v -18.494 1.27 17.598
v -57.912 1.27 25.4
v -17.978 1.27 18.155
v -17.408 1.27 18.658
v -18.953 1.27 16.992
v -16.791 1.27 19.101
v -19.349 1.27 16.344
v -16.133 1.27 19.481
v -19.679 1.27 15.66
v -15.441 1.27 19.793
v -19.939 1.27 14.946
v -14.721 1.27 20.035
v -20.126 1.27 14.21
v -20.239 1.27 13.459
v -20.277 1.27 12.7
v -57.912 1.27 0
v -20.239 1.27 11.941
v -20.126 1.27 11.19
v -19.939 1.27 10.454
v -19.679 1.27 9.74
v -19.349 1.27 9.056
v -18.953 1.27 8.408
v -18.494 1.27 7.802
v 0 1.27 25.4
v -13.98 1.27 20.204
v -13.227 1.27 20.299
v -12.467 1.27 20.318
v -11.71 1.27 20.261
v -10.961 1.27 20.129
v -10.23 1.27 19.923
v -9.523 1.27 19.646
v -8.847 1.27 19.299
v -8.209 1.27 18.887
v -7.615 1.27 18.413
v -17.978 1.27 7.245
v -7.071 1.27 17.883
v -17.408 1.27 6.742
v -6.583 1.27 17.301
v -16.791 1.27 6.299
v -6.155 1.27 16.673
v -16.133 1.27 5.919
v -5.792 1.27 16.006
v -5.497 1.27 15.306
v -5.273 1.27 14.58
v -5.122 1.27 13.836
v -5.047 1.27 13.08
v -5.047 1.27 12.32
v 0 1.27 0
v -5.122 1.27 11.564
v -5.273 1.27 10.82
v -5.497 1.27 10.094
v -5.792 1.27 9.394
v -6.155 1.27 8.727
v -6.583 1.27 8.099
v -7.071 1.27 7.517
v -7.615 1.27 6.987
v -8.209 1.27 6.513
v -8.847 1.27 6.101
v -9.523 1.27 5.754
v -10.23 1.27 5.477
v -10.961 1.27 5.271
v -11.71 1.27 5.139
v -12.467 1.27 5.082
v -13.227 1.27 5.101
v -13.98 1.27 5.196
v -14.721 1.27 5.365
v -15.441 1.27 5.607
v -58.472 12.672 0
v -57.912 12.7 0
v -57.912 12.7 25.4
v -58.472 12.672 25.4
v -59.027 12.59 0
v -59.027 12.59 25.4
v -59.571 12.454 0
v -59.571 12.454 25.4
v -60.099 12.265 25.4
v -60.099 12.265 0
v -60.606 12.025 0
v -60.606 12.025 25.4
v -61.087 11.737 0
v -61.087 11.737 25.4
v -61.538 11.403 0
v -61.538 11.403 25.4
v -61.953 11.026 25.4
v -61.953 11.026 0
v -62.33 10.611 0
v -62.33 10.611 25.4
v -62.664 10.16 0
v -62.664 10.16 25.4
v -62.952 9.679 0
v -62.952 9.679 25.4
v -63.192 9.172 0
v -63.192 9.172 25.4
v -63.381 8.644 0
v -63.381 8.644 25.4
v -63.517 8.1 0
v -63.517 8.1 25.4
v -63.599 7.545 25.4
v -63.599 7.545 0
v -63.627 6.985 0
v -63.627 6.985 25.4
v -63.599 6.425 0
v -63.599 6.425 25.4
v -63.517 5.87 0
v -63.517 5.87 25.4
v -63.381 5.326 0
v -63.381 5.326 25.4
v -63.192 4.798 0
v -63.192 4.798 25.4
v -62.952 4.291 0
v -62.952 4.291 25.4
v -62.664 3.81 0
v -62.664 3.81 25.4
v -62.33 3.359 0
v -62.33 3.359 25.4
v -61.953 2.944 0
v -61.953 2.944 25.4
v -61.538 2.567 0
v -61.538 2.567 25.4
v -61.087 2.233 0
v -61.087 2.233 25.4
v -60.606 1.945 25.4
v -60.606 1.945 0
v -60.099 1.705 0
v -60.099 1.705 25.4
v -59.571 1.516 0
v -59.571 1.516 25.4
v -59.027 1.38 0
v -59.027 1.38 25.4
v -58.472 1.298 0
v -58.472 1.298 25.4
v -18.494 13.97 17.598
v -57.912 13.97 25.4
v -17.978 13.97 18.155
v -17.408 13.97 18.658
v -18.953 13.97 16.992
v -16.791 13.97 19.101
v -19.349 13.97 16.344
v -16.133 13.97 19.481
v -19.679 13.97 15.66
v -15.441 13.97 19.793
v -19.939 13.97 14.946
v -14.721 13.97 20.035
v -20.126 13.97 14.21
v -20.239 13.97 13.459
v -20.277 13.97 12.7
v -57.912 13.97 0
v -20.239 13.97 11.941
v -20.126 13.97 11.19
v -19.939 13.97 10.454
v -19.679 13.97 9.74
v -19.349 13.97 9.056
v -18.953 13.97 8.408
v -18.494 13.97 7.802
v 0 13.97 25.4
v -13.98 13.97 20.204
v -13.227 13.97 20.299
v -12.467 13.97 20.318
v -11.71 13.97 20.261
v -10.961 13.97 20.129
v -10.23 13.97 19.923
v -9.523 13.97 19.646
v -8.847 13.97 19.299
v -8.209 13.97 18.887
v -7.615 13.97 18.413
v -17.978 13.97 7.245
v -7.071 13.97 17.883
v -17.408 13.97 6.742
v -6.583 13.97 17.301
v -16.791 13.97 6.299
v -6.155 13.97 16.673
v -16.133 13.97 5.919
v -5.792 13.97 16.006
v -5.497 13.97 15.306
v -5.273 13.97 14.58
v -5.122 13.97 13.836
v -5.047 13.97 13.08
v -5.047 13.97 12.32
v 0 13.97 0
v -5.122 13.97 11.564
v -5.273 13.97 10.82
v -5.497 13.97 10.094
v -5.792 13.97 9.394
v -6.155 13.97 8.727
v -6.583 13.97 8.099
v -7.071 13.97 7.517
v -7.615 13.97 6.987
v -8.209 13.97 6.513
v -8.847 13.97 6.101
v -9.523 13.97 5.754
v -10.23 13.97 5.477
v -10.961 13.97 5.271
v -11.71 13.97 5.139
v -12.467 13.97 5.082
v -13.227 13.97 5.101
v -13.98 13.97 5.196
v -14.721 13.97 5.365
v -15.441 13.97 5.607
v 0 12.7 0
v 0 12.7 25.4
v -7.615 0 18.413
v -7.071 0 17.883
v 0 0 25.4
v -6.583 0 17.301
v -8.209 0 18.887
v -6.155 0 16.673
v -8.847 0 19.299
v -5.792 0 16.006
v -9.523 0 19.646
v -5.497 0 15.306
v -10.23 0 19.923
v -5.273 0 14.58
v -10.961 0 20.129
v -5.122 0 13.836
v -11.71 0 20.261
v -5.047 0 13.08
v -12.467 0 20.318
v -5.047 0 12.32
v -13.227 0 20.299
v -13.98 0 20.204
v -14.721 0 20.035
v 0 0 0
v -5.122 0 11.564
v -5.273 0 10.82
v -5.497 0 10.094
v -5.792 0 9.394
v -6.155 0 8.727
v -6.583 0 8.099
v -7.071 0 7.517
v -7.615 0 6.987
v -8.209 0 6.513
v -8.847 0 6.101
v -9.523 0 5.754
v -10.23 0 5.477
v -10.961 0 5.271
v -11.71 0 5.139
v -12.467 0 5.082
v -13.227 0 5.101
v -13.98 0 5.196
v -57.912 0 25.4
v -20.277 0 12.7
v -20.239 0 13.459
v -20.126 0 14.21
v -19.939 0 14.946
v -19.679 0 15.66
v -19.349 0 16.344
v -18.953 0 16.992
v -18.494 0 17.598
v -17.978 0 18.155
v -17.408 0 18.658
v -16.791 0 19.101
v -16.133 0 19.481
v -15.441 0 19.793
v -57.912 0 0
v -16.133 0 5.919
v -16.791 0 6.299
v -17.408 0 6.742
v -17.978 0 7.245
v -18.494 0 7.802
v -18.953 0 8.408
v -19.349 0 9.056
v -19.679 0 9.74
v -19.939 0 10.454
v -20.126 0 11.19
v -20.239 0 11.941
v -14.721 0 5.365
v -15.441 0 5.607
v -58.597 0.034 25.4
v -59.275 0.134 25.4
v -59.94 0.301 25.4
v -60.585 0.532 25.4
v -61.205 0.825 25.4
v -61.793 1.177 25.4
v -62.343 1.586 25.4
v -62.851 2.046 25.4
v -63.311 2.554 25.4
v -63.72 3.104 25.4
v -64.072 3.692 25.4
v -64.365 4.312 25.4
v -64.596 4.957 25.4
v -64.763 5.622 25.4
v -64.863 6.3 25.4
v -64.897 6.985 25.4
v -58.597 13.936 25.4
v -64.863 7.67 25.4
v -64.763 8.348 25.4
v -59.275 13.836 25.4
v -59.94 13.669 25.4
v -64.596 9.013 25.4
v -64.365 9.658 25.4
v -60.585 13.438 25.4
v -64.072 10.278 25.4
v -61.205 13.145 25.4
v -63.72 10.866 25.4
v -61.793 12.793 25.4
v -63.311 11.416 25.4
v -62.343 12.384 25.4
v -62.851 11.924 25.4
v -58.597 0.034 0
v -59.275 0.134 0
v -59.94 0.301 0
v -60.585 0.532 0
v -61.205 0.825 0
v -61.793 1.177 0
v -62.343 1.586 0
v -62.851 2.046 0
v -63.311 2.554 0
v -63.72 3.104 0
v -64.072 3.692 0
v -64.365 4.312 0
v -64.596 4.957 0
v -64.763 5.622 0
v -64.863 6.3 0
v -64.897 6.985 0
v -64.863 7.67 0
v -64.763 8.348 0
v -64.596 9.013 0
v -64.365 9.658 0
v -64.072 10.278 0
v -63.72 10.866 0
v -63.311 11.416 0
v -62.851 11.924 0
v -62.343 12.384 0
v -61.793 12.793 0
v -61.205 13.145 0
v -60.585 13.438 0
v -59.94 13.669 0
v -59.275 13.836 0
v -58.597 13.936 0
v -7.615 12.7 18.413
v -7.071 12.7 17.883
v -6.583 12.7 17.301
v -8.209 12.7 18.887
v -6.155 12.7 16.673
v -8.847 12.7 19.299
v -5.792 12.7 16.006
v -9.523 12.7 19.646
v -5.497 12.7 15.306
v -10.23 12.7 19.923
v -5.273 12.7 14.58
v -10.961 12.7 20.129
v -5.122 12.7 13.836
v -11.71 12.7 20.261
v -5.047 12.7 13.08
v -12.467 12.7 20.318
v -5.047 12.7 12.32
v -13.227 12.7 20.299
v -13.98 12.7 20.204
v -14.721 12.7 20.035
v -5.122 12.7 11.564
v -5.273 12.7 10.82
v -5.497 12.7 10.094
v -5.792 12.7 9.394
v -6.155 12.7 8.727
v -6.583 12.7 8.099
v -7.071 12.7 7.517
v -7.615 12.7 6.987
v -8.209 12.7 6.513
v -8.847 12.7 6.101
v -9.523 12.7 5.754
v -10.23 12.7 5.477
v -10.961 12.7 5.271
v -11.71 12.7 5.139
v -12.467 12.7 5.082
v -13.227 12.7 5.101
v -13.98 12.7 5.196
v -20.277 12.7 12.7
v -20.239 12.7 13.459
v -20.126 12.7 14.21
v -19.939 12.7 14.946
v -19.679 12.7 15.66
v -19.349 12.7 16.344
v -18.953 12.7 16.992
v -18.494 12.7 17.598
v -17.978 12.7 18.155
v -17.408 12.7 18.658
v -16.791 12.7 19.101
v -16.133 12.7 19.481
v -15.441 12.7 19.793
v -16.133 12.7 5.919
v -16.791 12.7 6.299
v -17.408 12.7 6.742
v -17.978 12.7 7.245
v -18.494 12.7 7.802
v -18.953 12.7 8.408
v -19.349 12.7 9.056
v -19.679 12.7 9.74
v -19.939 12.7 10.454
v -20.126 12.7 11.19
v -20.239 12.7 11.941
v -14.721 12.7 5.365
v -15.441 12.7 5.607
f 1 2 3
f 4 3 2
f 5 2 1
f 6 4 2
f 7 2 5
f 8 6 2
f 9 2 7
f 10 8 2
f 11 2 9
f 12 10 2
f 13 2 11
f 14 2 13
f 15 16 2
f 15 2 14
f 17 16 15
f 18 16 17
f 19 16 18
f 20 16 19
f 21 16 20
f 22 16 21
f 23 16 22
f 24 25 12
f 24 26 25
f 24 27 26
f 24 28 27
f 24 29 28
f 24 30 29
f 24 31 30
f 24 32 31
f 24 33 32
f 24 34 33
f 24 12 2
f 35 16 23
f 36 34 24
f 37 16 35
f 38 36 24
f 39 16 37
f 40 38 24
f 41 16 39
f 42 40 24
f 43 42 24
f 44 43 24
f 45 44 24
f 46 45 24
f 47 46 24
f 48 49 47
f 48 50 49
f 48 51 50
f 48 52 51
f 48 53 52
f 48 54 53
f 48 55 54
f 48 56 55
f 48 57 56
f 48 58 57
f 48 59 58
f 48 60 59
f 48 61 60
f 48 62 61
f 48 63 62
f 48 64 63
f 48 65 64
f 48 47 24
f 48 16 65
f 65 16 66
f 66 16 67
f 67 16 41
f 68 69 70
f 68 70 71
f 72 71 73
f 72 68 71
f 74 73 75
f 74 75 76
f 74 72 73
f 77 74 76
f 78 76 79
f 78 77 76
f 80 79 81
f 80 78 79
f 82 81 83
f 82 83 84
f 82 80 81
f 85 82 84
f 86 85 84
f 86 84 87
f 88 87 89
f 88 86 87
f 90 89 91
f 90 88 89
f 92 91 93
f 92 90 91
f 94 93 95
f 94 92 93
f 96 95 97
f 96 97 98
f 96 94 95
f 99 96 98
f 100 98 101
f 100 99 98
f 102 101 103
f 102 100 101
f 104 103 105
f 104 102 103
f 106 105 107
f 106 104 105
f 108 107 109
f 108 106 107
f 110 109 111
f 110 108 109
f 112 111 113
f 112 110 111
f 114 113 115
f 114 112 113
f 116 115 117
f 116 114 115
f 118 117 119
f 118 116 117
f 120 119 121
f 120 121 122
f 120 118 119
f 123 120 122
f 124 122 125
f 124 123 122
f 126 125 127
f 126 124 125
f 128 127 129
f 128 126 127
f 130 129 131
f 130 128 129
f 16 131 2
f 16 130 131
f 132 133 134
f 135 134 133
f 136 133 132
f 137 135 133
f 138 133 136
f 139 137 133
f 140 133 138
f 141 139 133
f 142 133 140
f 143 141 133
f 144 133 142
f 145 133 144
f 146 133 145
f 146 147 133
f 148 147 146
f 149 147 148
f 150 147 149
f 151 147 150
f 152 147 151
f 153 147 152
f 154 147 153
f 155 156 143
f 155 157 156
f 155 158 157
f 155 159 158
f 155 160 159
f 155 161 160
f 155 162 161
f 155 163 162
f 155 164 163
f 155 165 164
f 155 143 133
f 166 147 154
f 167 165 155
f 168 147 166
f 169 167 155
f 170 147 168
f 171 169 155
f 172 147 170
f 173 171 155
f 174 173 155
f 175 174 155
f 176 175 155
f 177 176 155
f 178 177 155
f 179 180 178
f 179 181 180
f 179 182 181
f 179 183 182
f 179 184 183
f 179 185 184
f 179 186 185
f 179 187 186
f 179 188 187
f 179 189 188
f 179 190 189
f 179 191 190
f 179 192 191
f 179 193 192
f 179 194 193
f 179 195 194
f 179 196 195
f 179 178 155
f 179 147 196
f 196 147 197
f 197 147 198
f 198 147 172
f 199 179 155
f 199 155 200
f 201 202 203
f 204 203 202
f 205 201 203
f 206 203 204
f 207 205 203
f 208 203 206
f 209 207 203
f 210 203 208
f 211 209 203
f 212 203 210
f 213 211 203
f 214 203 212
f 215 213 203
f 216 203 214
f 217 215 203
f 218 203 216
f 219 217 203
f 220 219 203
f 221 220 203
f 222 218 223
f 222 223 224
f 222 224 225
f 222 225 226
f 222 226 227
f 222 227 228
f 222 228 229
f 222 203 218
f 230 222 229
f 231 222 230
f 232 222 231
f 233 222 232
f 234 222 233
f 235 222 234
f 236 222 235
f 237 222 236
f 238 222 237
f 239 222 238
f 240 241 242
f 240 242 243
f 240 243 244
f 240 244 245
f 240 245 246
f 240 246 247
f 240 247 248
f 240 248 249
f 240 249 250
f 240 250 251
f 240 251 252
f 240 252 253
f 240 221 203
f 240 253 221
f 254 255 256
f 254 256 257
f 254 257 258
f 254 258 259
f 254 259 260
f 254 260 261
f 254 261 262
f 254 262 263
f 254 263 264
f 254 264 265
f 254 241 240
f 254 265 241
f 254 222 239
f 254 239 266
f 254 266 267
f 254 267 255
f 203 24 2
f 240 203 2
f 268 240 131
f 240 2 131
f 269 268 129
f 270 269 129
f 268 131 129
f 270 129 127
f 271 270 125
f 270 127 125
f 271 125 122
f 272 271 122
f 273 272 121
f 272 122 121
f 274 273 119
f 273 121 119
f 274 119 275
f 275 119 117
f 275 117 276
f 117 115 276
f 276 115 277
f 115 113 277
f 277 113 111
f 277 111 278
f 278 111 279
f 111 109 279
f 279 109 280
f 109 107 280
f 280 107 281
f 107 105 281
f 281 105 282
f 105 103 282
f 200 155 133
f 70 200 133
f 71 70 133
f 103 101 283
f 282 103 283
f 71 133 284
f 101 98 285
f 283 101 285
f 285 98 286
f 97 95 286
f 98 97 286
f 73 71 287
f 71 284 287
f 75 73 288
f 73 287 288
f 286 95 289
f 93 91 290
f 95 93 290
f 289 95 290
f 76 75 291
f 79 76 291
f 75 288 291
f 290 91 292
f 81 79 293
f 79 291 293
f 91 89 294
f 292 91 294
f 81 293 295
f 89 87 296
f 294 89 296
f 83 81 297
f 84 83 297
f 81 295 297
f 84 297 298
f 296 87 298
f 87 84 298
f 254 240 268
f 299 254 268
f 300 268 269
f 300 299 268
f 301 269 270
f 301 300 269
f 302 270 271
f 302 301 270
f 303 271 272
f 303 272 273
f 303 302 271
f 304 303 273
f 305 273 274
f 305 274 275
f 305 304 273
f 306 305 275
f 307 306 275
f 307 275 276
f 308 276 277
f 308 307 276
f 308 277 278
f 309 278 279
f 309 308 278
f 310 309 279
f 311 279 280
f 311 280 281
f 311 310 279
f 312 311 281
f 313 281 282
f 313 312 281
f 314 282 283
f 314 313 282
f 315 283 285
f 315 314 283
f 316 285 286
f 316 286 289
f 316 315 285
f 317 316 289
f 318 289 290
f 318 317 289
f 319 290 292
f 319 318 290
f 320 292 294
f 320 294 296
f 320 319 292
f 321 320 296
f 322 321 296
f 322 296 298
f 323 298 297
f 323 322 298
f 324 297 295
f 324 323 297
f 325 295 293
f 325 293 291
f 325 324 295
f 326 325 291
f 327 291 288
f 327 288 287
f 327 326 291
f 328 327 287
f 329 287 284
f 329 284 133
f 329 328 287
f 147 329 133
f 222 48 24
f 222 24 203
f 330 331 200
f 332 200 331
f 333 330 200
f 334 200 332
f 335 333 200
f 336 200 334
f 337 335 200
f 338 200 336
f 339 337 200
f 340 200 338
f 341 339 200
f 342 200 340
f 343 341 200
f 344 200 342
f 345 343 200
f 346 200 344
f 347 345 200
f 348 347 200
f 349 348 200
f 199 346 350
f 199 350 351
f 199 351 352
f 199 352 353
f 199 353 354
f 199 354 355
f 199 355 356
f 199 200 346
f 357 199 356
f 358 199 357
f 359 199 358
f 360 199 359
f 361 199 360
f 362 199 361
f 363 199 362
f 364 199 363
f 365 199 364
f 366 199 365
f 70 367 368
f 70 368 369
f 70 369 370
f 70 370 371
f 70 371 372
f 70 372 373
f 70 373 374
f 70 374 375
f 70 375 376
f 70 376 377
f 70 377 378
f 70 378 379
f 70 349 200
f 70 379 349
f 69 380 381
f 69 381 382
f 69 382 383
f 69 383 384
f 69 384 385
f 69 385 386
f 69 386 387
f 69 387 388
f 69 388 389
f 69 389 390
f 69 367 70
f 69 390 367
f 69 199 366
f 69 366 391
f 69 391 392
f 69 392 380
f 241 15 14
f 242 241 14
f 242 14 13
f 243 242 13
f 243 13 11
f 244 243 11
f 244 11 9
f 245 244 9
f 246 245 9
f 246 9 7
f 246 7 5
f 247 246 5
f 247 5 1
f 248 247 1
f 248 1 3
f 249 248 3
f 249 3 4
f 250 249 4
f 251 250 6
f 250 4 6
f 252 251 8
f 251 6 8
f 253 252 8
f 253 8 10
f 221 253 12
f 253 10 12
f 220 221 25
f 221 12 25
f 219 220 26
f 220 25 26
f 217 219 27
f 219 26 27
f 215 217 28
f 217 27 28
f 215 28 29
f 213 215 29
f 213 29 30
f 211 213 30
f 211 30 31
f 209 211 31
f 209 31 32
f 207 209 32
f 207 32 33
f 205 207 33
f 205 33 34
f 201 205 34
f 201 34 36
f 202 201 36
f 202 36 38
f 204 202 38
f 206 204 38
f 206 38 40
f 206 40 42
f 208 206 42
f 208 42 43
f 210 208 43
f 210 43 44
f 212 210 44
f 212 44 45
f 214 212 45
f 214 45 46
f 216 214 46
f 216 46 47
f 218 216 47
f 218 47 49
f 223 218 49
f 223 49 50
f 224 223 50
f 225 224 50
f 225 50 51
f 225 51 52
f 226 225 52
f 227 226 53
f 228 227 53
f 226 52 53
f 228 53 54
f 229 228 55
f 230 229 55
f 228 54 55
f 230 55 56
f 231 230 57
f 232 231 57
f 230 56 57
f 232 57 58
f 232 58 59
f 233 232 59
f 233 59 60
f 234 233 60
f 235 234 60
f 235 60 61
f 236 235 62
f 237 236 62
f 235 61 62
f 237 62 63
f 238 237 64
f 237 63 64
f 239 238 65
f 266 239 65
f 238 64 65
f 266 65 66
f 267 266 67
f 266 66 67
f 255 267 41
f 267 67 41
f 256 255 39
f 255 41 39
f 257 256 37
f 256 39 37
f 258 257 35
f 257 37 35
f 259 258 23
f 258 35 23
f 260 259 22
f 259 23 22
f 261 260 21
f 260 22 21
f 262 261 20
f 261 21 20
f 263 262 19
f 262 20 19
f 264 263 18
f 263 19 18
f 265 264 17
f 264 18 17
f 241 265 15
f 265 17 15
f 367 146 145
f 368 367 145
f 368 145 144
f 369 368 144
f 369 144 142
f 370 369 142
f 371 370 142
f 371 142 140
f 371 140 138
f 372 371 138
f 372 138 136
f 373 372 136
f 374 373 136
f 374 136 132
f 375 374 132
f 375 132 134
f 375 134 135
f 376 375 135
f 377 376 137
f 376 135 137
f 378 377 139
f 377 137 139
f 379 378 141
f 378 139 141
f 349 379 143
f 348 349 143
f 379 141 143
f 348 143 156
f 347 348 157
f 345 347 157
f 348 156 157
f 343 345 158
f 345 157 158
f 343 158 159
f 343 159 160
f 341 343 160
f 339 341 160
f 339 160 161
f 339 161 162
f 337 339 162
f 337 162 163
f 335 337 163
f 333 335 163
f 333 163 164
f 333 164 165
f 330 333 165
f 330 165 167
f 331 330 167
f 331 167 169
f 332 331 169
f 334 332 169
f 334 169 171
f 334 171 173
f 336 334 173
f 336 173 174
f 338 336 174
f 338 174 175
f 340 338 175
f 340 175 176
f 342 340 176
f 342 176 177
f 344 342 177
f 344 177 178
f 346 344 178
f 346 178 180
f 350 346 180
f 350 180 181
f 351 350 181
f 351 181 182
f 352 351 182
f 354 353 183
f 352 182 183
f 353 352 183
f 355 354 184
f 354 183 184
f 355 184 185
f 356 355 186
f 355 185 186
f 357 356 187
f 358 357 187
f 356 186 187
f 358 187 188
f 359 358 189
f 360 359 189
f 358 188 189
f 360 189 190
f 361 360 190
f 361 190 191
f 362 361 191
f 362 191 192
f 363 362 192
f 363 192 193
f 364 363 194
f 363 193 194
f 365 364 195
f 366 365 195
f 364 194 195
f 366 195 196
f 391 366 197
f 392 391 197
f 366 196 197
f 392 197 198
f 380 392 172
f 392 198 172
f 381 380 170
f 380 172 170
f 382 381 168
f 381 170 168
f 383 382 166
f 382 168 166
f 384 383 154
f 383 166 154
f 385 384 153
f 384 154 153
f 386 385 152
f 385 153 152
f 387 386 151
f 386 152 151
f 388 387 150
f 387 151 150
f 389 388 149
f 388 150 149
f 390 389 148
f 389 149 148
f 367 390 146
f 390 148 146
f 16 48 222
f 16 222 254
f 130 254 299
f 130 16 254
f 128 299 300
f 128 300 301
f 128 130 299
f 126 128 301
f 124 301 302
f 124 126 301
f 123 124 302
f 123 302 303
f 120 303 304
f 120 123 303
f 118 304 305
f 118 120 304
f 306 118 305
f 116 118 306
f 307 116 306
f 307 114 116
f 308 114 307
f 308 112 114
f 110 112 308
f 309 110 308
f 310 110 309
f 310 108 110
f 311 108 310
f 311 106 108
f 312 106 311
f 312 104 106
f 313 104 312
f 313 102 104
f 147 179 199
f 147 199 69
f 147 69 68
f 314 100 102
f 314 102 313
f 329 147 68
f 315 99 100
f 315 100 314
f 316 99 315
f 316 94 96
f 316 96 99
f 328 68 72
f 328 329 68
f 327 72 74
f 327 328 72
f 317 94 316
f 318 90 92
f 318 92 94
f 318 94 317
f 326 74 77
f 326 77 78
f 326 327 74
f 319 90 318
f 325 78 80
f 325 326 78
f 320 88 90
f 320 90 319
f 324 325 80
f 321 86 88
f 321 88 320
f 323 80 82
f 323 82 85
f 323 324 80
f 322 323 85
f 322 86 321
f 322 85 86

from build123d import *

# Parameters (mm, degrees)
BOSS_EXTRUDE1_DEPTH = 25.4
SKETCH3_R           = 7.62
CUT_EXTRUDE1_DEPTH  = 25.4


with BuildPart() as part:
    # Sketch2 → Boss-Extrude1 (new body)
    with BuildSketch(Plane.XY):
        with BuildLine():
            ThreePointArc((-57.912, 0), (-64.897, 6.985), (-57.912, 13.97))
            Line((-57.912, 13.97), (0, 13.97))
            Line((0, 13.97), (0, 12.7))
            Line((0, 12.7), (-57.912, 12.7))
            ThreePointArc((-57.912, 12.7), (-63.627, 6.985), (-57.912, 1.27))
            Line((-57.912, 1.27), (0, 1.27))
            Line((0, 1.27), (0, 0))
            Line((0, 0), (-57.912, 0))
        make_face()
    extrude(amount=BOSS_EXTRUDE1_DEPTH)

    # Sketch3 → Cut-Extrude1 (cut)
    with BuildSketch(Plane(origin=(0, 13.97, 0), x_dir=(1, 0, 0), z_dir=(0, 1, 0))):
        with Locations(Location((-12.65707914, -12.7, 0), (0, 0, 180))):
            Circle(SKETCH3_R)
    extrude(amount=-CUT_EXTRUDE1_DEPTH, mode=Mode.SUBTRACT)


solid = part.part
